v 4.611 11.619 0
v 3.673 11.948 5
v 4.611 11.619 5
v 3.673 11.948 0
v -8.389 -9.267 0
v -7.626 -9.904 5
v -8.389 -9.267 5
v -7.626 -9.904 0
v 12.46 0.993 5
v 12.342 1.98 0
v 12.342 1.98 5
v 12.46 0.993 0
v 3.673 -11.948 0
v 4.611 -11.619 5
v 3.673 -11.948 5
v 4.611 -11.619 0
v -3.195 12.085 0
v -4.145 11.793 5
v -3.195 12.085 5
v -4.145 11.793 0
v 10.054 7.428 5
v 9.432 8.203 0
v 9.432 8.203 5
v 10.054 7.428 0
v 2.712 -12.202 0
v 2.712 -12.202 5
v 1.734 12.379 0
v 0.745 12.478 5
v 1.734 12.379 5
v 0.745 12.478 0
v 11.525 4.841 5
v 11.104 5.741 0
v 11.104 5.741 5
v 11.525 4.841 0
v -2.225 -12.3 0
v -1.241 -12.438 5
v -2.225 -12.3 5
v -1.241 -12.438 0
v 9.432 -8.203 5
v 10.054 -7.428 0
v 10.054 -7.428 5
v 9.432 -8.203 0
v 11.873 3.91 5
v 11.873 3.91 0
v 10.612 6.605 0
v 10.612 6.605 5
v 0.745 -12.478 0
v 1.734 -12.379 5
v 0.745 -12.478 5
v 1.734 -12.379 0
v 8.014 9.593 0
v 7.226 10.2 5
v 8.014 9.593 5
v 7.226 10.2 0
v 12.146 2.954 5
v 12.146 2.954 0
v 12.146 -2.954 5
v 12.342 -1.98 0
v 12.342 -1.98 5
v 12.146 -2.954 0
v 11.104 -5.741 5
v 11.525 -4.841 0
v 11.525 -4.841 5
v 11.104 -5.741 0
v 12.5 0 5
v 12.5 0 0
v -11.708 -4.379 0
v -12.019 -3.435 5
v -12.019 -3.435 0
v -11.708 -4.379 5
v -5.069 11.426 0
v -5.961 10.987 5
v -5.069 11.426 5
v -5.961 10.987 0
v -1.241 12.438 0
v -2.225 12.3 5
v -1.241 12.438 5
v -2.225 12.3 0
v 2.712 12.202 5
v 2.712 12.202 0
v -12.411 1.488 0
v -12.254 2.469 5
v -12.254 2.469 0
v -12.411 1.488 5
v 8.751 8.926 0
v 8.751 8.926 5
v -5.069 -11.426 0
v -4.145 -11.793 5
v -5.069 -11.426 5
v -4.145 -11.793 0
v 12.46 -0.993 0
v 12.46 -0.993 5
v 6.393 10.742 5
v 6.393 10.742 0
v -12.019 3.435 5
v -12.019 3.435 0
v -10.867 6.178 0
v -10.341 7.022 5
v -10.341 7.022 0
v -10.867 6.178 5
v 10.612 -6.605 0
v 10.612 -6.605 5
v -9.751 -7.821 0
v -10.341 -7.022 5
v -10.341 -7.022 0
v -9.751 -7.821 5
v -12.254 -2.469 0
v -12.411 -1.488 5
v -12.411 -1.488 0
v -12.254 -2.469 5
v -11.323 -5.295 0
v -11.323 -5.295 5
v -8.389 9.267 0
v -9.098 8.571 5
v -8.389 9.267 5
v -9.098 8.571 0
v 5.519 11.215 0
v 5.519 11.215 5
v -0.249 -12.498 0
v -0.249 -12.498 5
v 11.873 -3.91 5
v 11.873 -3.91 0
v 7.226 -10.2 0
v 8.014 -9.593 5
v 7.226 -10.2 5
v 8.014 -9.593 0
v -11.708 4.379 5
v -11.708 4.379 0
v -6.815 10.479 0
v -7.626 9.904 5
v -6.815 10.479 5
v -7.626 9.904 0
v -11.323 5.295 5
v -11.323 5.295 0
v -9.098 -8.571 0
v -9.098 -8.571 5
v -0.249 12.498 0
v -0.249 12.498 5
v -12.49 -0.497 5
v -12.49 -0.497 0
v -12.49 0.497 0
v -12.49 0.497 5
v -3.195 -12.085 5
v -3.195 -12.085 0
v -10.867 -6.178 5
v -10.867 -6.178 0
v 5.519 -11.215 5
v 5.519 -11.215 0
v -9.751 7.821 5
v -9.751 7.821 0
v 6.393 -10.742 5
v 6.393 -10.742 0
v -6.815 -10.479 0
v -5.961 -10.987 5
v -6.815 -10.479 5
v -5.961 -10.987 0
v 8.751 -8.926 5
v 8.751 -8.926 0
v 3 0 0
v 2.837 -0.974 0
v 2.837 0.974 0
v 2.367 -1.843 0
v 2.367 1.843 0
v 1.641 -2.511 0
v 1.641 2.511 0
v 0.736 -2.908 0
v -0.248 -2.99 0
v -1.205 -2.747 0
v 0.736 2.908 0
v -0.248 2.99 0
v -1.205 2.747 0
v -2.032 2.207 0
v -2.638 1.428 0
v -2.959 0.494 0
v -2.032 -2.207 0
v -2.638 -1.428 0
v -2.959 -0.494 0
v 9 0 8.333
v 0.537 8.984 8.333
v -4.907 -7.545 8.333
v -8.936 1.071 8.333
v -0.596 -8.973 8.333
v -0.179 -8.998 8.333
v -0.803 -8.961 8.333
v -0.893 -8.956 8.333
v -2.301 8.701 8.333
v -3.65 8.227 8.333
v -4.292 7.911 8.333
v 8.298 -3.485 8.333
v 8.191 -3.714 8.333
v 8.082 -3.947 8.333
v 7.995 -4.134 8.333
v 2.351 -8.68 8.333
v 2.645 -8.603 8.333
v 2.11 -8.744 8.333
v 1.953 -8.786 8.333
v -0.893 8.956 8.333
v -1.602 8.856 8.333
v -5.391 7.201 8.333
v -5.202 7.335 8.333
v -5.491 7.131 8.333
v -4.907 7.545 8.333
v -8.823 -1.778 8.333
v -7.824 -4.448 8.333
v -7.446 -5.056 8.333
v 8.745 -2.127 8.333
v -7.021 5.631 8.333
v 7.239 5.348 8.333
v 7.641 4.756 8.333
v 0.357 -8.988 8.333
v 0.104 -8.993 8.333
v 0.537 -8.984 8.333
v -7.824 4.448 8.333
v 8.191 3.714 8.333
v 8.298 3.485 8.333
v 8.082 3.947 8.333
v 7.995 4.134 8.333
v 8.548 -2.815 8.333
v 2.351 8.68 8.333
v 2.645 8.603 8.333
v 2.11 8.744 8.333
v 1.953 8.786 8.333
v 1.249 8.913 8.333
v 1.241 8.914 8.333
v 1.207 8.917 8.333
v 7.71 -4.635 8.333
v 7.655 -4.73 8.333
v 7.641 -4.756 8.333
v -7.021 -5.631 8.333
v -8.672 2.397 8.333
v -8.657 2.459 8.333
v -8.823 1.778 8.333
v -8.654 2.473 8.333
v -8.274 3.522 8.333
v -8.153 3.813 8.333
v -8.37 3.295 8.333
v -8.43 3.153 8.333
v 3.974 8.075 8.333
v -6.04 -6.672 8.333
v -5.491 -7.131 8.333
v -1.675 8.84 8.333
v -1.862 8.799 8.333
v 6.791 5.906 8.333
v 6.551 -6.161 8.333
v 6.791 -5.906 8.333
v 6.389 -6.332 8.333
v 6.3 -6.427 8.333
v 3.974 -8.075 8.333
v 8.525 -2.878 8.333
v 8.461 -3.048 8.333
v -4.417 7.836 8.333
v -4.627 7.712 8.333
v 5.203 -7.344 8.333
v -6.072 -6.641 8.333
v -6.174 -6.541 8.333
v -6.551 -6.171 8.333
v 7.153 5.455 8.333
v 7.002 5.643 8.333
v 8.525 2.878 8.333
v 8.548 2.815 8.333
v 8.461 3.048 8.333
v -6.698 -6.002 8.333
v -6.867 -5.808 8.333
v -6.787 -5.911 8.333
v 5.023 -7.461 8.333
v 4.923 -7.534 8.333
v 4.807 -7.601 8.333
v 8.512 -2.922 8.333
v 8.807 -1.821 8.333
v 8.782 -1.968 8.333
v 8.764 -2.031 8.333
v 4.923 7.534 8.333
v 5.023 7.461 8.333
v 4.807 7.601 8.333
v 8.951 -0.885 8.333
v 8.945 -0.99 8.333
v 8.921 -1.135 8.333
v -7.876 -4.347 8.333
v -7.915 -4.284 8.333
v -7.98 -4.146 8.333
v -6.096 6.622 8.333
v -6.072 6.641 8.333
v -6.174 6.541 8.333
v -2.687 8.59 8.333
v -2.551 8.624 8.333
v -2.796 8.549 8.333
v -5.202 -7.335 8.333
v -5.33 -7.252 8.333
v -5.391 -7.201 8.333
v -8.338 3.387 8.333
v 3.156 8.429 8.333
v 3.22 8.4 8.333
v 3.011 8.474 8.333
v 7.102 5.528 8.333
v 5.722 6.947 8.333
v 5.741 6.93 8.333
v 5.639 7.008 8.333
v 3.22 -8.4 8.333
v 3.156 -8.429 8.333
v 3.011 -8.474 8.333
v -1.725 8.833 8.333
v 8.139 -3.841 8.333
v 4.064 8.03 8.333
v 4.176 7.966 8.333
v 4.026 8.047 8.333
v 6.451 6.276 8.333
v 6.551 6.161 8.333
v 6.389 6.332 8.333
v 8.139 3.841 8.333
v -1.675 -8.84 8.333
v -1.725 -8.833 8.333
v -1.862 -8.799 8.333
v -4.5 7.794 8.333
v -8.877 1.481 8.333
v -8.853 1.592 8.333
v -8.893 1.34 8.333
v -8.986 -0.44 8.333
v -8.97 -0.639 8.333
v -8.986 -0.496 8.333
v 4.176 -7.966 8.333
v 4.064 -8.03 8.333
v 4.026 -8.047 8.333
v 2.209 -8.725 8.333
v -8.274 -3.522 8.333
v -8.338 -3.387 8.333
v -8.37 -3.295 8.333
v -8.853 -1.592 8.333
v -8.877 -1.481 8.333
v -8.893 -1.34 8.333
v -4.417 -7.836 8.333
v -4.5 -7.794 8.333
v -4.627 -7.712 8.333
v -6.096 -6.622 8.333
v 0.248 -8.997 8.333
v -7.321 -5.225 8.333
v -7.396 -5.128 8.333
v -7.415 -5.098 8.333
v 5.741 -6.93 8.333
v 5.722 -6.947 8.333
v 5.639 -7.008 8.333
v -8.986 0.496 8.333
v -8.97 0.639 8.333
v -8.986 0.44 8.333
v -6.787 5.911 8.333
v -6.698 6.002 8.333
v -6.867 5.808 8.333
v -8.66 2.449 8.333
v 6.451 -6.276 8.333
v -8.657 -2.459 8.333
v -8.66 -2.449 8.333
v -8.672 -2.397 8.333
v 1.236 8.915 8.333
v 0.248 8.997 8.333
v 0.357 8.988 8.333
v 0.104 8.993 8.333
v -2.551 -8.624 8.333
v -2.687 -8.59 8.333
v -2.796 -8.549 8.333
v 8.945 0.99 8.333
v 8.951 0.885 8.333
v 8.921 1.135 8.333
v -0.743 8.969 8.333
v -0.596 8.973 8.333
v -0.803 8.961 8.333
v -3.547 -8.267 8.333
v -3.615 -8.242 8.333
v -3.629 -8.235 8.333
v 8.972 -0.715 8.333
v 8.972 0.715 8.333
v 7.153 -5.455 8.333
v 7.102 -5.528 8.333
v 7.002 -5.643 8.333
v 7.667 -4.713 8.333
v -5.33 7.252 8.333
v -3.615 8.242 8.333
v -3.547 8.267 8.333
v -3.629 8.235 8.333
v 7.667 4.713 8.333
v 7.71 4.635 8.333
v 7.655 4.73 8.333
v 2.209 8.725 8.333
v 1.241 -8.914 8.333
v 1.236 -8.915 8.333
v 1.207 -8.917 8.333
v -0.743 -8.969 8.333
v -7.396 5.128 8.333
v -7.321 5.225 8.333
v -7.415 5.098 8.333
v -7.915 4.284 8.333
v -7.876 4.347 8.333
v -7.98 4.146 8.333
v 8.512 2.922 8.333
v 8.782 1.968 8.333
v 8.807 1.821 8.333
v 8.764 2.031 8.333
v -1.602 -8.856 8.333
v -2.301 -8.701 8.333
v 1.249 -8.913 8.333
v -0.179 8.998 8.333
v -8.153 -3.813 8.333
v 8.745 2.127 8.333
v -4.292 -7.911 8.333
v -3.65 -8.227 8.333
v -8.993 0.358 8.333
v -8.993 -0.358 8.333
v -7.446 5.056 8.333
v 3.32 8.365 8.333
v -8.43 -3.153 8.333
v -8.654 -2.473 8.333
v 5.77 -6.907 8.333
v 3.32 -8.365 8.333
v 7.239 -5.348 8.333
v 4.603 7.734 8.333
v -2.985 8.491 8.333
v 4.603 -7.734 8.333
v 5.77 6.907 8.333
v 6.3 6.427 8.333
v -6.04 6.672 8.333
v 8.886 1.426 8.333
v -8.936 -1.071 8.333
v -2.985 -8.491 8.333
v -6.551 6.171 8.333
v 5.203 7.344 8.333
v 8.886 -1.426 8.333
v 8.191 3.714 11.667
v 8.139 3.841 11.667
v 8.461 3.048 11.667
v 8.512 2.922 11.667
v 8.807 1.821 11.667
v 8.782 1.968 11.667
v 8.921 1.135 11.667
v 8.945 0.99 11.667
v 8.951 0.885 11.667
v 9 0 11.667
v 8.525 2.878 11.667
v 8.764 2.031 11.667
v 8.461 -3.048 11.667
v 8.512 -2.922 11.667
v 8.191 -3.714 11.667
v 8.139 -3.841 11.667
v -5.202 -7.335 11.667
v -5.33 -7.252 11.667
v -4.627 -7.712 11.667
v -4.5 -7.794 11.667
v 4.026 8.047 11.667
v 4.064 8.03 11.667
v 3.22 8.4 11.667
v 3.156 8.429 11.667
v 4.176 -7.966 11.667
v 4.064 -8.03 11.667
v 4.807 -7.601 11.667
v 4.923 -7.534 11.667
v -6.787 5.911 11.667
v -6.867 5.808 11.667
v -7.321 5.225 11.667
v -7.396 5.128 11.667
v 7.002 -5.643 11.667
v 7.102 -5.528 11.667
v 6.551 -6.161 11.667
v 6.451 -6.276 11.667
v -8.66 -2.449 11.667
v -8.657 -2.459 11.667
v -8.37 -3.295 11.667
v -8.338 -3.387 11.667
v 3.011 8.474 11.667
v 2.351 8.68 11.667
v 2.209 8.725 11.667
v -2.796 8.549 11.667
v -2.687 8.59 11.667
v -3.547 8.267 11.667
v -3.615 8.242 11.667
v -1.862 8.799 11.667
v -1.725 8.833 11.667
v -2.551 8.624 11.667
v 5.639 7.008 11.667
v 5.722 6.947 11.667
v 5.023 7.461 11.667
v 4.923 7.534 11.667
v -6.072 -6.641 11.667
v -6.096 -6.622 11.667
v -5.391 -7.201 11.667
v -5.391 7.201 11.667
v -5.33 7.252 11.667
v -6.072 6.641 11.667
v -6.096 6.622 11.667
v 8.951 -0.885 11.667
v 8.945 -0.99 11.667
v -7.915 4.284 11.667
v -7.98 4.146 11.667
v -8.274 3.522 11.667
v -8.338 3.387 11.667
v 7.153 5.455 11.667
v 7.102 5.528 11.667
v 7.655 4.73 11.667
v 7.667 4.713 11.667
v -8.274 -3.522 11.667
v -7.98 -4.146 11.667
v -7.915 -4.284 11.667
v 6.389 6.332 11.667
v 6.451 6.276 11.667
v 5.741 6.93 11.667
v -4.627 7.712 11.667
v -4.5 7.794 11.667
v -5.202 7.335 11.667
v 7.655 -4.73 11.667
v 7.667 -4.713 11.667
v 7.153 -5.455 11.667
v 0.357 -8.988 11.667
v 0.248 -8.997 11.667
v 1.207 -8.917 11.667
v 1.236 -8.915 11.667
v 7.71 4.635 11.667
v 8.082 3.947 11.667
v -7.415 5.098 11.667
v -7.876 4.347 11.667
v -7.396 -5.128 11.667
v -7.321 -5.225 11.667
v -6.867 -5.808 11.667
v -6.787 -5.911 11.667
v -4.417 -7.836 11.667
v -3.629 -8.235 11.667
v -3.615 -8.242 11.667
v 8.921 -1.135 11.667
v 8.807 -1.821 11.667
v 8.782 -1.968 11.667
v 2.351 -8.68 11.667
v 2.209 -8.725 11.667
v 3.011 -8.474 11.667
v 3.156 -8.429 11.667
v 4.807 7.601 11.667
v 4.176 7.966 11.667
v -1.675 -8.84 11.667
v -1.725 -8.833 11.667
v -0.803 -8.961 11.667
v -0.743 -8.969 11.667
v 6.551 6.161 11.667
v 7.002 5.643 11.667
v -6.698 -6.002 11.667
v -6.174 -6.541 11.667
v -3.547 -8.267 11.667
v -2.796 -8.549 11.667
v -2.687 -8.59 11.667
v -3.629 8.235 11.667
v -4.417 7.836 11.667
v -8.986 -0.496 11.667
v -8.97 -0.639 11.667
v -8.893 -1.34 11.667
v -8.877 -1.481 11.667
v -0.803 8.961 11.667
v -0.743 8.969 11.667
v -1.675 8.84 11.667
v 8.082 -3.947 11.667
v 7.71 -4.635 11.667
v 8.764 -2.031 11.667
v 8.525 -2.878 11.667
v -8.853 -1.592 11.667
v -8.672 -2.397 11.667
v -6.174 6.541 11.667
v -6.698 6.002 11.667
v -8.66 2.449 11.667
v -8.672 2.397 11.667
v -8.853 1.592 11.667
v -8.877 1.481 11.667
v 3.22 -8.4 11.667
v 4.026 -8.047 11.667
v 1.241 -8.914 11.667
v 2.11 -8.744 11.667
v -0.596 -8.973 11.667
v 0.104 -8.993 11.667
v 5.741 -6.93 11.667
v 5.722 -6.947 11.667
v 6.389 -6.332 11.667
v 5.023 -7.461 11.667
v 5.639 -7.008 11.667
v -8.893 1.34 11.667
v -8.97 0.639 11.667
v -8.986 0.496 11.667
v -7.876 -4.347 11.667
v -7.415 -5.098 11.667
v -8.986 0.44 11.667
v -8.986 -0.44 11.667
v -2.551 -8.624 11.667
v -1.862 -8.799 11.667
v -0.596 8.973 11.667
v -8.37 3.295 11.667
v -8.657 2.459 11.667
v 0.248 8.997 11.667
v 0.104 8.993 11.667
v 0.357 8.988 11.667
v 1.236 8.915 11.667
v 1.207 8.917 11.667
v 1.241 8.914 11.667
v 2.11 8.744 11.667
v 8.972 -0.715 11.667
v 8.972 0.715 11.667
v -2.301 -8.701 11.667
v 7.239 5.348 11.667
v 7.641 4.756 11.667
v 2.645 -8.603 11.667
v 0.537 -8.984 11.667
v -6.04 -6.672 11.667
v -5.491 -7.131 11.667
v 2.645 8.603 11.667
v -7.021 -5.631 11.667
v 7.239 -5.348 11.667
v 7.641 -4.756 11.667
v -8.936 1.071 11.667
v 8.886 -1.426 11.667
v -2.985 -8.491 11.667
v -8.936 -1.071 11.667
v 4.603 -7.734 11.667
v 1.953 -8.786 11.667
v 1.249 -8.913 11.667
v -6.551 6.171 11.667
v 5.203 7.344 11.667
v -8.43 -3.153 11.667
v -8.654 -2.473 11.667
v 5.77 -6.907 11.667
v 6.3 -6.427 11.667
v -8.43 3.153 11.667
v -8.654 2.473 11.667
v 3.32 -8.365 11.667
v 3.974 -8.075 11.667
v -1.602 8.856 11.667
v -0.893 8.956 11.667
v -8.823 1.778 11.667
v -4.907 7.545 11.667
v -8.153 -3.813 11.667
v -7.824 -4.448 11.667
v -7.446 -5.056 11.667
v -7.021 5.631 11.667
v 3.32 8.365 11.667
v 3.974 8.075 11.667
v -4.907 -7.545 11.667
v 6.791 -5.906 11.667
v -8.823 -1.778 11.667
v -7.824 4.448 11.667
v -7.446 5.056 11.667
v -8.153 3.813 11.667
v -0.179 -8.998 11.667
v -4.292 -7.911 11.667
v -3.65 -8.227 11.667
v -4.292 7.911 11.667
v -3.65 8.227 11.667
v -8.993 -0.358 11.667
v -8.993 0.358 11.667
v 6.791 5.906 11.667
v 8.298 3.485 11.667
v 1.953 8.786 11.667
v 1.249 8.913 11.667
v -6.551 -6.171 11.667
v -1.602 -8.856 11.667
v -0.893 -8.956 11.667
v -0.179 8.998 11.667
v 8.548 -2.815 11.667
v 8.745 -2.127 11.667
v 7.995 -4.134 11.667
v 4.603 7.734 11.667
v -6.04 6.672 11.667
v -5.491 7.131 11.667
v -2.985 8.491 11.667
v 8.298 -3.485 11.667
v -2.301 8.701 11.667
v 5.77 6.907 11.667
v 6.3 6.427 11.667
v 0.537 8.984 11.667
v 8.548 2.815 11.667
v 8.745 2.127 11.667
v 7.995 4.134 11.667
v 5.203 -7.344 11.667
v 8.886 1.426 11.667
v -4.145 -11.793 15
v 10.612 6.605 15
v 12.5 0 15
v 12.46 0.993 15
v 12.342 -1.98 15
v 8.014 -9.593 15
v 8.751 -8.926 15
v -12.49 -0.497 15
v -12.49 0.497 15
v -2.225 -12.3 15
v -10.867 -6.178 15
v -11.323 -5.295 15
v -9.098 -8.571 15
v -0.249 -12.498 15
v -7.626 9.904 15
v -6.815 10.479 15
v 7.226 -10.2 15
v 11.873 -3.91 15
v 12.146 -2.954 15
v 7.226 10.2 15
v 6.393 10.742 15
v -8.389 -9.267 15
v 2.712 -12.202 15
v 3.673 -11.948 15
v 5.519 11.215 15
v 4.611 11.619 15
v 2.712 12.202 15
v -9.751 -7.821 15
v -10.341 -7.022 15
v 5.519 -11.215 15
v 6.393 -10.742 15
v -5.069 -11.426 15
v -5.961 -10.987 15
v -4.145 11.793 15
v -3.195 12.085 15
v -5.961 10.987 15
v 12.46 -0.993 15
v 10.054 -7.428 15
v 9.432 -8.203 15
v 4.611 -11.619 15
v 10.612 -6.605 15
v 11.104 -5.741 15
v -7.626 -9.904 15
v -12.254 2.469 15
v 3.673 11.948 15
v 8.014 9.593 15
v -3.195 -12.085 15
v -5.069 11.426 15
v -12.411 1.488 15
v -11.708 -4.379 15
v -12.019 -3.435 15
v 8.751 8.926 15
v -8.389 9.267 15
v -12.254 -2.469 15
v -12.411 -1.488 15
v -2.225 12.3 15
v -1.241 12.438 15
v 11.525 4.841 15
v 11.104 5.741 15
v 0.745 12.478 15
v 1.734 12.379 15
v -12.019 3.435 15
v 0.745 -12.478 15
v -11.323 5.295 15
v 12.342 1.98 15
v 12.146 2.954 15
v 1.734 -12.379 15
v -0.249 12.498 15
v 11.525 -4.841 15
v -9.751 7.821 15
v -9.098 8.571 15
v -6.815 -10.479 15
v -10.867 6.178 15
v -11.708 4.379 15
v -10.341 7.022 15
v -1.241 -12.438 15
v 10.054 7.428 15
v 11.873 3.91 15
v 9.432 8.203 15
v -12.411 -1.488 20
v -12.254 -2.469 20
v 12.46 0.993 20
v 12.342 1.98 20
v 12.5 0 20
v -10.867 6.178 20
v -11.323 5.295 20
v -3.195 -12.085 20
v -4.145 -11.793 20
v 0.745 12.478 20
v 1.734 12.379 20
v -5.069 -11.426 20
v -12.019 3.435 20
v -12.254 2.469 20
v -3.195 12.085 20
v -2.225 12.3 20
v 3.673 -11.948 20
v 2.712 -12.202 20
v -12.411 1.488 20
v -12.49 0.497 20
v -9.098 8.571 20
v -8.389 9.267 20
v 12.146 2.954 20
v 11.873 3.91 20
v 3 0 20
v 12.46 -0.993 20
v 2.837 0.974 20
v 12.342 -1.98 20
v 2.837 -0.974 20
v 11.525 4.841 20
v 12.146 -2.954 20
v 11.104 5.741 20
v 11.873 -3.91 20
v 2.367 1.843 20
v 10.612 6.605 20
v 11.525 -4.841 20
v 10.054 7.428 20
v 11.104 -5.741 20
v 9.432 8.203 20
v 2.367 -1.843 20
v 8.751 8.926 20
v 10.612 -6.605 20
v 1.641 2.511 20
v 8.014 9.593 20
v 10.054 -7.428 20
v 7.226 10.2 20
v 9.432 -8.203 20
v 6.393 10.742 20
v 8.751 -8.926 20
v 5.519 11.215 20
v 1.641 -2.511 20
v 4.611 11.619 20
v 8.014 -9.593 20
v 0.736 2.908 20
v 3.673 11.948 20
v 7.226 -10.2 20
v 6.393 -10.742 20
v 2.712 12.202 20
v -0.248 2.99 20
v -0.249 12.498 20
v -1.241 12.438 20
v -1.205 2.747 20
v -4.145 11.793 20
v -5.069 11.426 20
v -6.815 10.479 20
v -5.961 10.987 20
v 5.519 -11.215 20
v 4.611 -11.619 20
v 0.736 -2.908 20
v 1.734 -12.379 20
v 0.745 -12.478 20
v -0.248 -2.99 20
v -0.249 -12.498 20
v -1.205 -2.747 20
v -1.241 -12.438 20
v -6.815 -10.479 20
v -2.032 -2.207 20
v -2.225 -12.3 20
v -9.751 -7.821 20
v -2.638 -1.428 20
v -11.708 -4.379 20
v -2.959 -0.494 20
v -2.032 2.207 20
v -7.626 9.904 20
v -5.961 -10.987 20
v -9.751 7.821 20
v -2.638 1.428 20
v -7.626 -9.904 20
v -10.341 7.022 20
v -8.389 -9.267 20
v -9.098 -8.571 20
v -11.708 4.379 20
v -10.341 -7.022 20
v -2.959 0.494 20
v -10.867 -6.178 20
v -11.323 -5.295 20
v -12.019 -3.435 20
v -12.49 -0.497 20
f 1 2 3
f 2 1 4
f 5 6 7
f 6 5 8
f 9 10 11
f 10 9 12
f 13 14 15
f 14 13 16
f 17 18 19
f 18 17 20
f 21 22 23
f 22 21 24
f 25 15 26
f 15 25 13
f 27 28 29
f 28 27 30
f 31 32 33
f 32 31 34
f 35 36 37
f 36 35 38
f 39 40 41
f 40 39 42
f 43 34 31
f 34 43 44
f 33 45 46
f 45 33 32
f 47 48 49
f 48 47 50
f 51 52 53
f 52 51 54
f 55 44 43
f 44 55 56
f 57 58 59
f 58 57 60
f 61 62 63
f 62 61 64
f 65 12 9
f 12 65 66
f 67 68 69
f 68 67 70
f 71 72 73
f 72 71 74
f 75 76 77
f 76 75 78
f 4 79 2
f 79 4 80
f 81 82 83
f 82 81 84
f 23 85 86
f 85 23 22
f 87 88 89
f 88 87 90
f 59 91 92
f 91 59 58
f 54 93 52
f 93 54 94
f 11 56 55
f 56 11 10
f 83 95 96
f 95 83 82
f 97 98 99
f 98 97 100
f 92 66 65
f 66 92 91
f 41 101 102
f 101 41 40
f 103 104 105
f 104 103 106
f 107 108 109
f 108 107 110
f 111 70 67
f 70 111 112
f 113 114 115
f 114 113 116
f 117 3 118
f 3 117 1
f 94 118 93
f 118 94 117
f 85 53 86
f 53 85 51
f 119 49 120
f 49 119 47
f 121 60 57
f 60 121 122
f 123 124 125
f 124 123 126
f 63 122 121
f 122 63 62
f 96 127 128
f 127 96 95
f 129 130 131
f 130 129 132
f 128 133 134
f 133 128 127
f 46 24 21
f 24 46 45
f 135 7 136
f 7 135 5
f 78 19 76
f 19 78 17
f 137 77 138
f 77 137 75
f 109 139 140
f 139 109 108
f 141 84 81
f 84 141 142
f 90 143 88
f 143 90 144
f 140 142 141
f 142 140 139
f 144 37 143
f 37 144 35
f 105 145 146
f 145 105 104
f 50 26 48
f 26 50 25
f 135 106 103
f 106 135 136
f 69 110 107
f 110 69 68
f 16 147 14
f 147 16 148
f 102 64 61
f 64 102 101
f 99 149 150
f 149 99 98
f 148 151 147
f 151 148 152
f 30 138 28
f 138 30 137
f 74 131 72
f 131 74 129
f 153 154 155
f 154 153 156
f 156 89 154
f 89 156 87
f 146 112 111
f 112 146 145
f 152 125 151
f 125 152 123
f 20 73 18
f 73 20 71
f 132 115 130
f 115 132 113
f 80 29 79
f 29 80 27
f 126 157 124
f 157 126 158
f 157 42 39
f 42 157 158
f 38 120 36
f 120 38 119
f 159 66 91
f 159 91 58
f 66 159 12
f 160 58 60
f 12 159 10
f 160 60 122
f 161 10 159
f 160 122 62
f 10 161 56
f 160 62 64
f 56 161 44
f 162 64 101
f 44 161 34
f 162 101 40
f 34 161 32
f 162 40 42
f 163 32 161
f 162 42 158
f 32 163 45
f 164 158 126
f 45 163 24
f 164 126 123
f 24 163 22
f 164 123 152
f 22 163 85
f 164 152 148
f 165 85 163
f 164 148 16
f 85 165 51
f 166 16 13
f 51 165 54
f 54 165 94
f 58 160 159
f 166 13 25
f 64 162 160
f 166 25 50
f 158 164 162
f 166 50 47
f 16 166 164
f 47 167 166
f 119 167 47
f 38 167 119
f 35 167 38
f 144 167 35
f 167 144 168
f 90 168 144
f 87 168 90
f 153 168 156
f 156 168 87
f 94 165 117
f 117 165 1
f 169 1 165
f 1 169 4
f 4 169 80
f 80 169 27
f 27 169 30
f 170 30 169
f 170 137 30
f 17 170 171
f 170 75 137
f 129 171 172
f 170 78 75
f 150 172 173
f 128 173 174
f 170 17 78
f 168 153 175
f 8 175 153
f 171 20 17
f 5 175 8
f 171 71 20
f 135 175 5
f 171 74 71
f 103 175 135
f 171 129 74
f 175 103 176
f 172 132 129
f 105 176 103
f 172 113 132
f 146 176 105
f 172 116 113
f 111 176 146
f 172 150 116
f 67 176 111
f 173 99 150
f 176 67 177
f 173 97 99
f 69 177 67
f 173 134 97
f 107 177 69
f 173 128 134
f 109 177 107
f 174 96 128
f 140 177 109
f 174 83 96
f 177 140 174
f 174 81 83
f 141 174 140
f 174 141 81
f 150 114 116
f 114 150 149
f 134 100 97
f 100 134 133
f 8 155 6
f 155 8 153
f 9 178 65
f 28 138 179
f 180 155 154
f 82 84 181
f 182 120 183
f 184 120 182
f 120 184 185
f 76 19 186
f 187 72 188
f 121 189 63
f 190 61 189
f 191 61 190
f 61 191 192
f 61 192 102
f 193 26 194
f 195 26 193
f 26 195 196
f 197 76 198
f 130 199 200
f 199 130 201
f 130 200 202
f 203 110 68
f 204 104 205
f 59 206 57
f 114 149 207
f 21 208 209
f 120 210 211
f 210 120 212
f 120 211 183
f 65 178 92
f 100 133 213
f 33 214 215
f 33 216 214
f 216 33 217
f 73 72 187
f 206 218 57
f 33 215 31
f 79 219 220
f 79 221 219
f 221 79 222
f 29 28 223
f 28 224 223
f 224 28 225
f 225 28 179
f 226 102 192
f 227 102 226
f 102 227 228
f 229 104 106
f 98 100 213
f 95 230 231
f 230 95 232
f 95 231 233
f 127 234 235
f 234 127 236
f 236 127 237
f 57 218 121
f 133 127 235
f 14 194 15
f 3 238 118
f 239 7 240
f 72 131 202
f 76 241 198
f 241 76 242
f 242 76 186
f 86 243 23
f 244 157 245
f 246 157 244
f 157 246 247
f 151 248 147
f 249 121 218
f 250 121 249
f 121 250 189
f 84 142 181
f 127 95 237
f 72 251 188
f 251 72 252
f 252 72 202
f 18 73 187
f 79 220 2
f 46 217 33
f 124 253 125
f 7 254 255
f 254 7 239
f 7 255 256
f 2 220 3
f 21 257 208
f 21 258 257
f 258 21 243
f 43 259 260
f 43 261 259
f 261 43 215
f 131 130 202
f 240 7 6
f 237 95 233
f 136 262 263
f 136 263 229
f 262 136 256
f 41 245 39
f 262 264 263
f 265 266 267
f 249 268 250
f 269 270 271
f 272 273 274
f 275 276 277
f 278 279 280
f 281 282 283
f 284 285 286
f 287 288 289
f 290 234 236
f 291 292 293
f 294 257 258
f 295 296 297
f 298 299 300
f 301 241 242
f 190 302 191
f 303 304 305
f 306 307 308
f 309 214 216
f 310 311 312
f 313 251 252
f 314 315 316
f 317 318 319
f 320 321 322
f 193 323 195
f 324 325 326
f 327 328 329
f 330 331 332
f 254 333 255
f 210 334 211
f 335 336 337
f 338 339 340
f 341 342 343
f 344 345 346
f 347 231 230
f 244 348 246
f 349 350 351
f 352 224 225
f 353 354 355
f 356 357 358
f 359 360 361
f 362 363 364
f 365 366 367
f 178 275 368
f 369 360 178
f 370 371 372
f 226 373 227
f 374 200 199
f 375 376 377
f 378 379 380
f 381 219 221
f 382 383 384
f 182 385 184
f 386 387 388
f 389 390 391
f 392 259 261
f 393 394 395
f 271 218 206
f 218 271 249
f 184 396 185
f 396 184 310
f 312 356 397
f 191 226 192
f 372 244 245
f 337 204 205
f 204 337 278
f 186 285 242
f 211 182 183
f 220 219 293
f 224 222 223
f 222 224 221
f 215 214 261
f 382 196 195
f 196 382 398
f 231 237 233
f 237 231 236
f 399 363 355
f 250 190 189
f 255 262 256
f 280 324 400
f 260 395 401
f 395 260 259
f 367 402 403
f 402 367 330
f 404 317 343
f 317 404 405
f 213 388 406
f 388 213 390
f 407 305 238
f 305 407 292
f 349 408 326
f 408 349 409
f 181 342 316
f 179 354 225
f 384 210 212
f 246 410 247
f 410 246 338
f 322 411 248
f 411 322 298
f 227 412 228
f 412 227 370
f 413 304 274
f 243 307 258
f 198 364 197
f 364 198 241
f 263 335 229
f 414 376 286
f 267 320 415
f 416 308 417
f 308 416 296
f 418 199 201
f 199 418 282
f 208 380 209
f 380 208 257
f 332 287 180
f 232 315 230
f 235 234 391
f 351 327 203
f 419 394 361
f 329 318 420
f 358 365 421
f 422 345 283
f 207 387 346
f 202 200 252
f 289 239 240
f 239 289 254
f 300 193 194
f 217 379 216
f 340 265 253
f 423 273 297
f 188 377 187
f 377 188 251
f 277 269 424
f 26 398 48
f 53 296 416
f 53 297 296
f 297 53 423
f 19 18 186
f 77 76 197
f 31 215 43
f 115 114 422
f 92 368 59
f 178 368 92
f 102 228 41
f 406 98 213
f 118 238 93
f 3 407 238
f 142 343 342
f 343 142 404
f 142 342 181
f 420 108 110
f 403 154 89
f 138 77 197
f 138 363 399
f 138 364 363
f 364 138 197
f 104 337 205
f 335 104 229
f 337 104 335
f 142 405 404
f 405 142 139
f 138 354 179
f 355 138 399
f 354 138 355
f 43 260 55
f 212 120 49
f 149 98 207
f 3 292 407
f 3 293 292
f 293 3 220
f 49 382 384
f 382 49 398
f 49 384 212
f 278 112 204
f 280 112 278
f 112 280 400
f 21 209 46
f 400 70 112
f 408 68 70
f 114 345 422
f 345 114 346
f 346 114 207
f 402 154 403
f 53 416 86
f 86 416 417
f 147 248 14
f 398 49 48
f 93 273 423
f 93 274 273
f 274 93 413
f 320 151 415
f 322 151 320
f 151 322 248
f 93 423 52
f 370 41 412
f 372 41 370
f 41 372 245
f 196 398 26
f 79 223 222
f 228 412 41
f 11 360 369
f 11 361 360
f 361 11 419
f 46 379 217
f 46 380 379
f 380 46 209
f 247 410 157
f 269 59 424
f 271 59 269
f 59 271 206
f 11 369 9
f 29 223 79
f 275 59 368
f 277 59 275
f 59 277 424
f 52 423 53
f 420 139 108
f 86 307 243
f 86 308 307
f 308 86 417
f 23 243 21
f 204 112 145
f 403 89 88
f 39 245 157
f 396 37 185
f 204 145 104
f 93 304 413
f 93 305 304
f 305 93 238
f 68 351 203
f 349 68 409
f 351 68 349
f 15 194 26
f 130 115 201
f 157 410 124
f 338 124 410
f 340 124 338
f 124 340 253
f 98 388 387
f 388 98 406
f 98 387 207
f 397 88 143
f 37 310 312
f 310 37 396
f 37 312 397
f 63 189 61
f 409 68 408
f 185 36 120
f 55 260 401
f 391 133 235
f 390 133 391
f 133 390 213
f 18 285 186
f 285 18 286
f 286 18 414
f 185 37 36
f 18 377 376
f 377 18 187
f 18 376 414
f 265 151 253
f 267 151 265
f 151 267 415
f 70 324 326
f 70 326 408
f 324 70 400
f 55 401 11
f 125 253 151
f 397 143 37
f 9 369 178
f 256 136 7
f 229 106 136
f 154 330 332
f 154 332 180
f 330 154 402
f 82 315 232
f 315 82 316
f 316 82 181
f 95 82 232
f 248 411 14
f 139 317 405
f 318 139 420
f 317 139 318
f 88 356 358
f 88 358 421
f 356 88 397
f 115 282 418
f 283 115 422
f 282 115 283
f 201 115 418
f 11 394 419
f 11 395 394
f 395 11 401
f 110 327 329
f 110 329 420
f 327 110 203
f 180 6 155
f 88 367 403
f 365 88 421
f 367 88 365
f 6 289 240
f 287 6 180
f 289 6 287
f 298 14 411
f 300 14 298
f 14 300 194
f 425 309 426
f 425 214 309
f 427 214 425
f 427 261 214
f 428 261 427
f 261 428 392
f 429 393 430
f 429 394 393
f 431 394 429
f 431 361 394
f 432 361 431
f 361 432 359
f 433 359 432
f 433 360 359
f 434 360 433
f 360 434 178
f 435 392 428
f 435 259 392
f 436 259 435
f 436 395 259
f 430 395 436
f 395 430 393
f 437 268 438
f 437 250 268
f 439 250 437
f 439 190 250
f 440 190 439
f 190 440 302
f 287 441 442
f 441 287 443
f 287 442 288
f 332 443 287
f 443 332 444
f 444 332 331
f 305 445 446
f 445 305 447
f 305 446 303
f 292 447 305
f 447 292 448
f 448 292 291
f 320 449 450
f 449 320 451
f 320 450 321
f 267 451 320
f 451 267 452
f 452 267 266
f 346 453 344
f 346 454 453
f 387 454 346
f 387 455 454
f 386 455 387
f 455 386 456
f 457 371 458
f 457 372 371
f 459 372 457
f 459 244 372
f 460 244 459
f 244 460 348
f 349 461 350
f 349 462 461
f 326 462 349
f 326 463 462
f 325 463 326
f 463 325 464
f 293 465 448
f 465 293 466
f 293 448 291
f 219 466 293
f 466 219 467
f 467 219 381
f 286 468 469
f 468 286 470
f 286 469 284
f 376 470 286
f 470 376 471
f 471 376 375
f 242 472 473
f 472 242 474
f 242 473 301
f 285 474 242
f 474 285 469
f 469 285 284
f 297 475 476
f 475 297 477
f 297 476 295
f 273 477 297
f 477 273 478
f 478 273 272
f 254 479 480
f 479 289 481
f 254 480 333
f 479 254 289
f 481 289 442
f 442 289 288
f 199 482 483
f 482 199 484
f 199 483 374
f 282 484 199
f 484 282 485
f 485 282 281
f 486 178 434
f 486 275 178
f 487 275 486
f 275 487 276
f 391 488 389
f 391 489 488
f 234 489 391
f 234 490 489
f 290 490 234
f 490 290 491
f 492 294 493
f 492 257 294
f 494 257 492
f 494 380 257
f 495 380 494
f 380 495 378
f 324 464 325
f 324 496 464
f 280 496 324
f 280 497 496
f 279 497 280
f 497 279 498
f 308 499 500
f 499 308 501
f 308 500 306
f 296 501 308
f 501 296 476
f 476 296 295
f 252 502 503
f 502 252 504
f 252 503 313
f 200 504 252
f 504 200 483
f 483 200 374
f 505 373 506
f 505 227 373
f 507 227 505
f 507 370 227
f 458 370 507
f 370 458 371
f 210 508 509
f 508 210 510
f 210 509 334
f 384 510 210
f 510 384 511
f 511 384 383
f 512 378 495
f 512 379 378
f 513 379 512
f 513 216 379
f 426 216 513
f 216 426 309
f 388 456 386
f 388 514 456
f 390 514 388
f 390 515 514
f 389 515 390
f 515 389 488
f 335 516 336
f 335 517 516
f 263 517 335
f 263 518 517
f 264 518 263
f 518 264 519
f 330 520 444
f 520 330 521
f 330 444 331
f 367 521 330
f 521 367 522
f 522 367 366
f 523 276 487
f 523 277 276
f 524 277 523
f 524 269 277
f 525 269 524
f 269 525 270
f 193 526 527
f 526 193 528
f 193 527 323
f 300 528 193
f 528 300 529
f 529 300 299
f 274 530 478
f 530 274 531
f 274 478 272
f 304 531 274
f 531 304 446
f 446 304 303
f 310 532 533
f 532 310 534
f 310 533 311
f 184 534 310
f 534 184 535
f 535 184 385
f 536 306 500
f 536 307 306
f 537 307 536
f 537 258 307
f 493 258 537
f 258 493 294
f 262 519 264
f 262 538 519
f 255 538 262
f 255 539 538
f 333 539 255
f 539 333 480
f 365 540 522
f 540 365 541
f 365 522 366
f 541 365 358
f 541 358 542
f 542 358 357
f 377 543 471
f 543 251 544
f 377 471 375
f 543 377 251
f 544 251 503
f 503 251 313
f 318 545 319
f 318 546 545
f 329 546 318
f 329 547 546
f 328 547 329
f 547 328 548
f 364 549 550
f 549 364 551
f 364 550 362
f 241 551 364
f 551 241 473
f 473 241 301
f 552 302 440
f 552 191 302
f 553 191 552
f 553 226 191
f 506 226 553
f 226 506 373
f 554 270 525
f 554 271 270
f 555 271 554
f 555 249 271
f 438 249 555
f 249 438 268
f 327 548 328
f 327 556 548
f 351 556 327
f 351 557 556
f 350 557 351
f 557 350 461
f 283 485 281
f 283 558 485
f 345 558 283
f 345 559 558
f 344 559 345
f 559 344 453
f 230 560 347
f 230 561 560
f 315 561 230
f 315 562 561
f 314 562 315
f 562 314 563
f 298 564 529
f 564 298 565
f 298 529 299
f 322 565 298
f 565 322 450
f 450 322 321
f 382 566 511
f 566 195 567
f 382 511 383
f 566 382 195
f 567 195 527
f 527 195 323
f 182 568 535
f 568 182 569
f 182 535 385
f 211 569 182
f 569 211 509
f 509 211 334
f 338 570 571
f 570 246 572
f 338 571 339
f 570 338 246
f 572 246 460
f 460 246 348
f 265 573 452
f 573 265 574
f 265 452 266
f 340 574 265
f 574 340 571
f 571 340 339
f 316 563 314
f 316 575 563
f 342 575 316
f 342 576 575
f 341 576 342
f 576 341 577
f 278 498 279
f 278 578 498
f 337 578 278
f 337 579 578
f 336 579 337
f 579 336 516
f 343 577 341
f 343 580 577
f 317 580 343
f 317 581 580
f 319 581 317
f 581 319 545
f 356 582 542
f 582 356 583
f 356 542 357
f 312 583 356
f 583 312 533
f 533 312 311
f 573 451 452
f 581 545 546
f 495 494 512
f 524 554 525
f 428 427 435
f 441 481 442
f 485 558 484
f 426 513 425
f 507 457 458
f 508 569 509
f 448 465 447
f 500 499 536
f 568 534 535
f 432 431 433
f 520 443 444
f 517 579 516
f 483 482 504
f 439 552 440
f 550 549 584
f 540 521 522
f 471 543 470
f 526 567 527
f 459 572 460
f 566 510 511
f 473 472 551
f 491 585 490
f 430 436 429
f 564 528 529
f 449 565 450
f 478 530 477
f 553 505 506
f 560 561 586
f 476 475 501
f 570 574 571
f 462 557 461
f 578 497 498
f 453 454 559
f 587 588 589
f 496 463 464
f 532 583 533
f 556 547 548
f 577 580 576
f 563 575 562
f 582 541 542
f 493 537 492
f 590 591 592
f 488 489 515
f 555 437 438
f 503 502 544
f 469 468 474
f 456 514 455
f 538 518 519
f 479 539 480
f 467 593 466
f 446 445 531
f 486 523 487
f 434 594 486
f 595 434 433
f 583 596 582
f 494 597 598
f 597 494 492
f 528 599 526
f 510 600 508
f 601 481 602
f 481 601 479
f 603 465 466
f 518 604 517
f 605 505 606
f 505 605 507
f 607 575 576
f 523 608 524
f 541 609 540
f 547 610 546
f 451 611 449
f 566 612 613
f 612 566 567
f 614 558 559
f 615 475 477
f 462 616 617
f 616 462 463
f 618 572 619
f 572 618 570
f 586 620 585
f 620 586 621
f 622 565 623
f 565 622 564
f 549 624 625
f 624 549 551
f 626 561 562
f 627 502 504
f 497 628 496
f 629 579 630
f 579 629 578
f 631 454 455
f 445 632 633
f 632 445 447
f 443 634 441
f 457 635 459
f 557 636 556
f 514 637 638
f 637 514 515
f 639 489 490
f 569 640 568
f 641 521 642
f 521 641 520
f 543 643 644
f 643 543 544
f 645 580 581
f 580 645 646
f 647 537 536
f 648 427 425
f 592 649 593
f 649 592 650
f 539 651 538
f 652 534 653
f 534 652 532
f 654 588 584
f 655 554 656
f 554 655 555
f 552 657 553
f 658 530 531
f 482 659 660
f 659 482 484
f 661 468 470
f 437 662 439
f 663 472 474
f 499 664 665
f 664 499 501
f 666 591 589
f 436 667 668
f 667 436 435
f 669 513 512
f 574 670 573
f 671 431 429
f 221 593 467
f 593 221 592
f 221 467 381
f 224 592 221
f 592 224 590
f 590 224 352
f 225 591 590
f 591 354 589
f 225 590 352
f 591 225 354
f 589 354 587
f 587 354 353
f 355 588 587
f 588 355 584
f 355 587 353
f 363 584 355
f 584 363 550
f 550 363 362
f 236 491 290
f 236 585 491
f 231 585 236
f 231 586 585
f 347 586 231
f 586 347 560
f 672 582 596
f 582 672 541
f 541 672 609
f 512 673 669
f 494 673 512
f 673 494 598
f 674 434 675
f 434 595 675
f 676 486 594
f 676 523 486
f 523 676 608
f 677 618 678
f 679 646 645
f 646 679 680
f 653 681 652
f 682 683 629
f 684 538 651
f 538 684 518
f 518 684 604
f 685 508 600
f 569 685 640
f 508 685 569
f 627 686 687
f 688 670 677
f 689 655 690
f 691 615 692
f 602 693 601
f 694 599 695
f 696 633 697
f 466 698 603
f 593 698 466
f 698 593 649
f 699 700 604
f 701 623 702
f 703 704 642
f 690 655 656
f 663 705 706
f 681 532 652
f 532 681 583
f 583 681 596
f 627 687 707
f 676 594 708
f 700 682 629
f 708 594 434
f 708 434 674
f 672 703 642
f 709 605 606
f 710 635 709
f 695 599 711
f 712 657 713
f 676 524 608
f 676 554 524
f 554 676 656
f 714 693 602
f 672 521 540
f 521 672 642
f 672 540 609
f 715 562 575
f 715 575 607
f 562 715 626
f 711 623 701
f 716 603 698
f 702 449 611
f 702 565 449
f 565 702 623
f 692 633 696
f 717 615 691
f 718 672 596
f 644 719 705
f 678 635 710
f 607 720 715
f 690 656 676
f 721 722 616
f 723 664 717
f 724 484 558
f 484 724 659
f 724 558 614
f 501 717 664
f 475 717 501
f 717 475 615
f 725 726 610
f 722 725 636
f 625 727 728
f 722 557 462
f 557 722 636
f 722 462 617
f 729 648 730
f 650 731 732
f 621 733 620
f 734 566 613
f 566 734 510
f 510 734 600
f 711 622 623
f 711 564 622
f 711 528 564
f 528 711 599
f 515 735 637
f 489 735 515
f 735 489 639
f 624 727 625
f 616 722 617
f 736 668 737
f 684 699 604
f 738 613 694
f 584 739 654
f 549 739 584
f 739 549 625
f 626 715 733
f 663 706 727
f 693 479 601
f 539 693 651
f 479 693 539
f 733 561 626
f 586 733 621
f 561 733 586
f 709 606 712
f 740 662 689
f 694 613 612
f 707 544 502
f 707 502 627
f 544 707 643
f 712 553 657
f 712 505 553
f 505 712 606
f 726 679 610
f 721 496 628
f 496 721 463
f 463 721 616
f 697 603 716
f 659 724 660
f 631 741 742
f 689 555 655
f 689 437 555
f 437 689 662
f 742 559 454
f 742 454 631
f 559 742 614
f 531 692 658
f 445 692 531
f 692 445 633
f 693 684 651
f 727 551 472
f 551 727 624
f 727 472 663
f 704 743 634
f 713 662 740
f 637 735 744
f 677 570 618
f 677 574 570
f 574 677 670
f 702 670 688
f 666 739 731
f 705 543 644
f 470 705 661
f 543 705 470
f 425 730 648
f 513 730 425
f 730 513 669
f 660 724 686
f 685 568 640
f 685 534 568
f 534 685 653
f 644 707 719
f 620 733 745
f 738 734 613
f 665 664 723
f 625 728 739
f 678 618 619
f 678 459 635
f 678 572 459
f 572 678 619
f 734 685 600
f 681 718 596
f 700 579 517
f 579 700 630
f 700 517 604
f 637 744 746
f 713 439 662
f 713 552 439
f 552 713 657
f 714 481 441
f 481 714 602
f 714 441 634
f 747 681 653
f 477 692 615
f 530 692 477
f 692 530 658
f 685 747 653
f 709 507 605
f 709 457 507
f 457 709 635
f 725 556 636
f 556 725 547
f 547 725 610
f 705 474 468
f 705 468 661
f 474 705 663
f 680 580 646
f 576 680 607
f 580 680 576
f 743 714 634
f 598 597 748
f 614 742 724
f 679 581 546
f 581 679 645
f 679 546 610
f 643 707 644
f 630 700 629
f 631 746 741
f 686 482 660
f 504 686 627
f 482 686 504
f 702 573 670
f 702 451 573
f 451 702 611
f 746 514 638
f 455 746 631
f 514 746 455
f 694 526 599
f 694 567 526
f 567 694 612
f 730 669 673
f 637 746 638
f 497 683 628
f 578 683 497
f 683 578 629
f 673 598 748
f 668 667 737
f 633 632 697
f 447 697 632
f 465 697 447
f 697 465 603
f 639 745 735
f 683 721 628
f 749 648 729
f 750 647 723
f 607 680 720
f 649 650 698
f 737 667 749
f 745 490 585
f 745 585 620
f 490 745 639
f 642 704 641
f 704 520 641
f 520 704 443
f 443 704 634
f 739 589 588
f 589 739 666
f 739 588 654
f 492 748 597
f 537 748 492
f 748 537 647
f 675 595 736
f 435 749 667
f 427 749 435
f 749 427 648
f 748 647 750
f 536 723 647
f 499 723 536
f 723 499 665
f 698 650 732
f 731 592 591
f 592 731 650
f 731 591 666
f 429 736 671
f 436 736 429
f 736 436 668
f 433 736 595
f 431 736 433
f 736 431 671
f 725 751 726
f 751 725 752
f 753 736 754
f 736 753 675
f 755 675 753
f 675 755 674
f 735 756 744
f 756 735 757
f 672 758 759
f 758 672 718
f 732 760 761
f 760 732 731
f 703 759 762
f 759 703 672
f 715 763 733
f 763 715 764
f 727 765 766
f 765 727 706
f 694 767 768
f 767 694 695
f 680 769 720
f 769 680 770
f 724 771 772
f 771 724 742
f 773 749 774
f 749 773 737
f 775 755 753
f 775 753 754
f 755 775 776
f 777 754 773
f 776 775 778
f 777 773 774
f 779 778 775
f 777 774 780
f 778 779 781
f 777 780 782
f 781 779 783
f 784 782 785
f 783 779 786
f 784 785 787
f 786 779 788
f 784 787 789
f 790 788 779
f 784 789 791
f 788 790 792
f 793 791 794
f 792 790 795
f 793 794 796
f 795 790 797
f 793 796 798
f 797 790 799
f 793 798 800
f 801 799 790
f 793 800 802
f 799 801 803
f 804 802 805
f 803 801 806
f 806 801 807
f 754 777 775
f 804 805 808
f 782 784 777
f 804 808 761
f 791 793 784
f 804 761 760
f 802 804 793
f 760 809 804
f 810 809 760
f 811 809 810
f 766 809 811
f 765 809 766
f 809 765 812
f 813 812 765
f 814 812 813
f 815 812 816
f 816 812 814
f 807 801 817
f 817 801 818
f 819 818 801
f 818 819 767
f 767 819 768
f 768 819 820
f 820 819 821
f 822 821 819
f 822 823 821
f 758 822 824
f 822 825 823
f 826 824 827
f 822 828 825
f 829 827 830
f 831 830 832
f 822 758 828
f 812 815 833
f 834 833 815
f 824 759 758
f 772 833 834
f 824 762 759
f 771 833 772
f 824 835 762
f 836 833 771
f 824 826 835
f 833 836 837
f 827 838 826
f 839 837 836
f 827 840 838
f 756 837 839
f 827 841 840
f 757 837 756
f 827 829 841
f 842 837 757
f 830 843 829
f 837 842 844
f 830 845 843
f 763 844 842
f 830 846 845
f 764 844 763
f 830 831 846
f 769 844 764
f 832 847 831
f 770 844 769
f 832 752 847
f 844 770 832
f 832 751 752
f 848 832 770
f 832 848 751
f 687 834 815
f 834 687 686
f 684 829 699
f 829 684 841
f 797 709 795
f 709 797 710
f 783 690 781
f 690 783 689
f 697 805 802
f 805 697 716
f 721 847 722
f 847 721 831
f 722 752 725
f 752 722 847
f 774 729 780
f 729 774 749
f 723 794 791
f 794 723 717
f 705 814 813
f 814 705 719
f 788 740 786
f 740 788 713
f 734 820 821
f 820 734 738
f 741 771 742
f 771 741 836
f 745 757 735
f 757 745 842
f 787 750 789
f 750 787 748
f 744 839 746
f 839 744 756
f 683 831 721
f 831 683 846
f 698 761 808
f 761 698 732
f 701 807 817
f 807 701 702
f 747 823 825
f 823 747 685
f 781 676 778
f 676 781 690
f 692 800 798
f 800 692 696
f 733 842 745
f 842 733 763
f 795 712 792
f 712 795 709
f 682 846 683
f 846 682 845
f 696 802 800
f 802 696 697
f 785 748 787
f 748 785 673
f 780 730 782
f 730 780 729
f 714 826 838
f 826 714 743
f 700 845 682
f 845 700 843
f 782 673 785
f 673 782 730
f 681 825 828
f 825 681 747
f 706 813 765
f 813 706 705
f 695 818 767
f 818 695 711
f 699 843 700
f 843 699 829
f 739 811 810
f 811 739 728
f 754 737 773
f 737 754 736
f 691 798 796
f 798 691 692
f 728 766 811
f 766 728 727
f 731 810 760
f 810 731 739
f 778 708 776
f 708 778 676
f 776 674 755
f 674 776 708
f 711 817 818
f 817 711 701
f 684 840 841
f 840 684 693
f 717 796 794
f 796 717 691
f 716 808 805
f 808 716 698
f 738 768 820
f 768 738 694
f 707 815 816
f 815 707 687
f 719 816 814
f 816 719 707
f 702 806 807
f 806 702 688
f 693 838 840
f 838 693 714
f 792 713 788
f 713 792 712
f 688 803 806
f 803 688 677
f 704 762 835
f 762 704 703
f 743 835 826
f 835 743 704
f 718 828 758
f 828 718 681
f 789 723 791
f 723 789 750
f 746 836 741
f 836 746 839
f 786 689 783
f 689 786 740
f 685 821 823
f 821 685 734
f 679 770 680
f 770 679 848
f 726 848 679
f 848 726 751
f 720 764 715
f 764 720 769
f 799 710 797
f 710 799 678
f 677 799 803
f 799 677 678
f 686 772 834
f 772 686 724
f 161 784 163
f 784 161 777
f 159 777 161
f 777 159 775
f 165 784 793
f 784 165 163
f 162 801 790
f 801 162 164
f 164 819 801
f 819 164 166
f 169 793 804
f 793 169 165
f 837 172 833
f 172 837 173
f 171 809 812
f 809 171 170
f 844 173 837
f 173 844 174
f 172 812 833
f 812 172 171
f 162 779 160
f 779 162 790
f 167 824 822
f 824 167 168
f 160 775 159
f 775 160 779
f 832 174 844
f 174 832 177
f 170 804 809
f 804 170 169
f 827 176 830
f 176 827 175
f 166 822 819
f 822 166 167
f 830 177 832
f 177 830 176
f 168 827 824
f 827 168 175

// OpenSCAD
/*
 * Small insulator for electric fences
 */
MajorDiam = 25;
MinDiam = 18;
InternalDiam = 6;
Height = 20;
Flat = 5;
Step = (Height - Flat * 2) / 3;


$fa =  1;
$fs = 1;

difference() {
  union() {
    cylinder(r=MajorDiam/2, h=Flat);
    translate([0, 0, Flat]) {
      cylinder(r2=MinDiam/2, r1=MajorDiam/2, h=Step);
    }
    translate([0, 0, Flat + Step]) {
      cylinder(r=MinDiam/2, h = Step);   
    }
    translate([0, 0, Flat + (Step* 2) ]) {
      cylinder(r1=MinDiam/2, r2=MajorDiam/2, h=Step);
    }
    
    translate([0, 0, Flat + Step*3]) {
      cylinder(r=MajorDiam/2, h=Flat);
    }
  }
  cylinder(r=InternalDiam/2, h=Height);
}
